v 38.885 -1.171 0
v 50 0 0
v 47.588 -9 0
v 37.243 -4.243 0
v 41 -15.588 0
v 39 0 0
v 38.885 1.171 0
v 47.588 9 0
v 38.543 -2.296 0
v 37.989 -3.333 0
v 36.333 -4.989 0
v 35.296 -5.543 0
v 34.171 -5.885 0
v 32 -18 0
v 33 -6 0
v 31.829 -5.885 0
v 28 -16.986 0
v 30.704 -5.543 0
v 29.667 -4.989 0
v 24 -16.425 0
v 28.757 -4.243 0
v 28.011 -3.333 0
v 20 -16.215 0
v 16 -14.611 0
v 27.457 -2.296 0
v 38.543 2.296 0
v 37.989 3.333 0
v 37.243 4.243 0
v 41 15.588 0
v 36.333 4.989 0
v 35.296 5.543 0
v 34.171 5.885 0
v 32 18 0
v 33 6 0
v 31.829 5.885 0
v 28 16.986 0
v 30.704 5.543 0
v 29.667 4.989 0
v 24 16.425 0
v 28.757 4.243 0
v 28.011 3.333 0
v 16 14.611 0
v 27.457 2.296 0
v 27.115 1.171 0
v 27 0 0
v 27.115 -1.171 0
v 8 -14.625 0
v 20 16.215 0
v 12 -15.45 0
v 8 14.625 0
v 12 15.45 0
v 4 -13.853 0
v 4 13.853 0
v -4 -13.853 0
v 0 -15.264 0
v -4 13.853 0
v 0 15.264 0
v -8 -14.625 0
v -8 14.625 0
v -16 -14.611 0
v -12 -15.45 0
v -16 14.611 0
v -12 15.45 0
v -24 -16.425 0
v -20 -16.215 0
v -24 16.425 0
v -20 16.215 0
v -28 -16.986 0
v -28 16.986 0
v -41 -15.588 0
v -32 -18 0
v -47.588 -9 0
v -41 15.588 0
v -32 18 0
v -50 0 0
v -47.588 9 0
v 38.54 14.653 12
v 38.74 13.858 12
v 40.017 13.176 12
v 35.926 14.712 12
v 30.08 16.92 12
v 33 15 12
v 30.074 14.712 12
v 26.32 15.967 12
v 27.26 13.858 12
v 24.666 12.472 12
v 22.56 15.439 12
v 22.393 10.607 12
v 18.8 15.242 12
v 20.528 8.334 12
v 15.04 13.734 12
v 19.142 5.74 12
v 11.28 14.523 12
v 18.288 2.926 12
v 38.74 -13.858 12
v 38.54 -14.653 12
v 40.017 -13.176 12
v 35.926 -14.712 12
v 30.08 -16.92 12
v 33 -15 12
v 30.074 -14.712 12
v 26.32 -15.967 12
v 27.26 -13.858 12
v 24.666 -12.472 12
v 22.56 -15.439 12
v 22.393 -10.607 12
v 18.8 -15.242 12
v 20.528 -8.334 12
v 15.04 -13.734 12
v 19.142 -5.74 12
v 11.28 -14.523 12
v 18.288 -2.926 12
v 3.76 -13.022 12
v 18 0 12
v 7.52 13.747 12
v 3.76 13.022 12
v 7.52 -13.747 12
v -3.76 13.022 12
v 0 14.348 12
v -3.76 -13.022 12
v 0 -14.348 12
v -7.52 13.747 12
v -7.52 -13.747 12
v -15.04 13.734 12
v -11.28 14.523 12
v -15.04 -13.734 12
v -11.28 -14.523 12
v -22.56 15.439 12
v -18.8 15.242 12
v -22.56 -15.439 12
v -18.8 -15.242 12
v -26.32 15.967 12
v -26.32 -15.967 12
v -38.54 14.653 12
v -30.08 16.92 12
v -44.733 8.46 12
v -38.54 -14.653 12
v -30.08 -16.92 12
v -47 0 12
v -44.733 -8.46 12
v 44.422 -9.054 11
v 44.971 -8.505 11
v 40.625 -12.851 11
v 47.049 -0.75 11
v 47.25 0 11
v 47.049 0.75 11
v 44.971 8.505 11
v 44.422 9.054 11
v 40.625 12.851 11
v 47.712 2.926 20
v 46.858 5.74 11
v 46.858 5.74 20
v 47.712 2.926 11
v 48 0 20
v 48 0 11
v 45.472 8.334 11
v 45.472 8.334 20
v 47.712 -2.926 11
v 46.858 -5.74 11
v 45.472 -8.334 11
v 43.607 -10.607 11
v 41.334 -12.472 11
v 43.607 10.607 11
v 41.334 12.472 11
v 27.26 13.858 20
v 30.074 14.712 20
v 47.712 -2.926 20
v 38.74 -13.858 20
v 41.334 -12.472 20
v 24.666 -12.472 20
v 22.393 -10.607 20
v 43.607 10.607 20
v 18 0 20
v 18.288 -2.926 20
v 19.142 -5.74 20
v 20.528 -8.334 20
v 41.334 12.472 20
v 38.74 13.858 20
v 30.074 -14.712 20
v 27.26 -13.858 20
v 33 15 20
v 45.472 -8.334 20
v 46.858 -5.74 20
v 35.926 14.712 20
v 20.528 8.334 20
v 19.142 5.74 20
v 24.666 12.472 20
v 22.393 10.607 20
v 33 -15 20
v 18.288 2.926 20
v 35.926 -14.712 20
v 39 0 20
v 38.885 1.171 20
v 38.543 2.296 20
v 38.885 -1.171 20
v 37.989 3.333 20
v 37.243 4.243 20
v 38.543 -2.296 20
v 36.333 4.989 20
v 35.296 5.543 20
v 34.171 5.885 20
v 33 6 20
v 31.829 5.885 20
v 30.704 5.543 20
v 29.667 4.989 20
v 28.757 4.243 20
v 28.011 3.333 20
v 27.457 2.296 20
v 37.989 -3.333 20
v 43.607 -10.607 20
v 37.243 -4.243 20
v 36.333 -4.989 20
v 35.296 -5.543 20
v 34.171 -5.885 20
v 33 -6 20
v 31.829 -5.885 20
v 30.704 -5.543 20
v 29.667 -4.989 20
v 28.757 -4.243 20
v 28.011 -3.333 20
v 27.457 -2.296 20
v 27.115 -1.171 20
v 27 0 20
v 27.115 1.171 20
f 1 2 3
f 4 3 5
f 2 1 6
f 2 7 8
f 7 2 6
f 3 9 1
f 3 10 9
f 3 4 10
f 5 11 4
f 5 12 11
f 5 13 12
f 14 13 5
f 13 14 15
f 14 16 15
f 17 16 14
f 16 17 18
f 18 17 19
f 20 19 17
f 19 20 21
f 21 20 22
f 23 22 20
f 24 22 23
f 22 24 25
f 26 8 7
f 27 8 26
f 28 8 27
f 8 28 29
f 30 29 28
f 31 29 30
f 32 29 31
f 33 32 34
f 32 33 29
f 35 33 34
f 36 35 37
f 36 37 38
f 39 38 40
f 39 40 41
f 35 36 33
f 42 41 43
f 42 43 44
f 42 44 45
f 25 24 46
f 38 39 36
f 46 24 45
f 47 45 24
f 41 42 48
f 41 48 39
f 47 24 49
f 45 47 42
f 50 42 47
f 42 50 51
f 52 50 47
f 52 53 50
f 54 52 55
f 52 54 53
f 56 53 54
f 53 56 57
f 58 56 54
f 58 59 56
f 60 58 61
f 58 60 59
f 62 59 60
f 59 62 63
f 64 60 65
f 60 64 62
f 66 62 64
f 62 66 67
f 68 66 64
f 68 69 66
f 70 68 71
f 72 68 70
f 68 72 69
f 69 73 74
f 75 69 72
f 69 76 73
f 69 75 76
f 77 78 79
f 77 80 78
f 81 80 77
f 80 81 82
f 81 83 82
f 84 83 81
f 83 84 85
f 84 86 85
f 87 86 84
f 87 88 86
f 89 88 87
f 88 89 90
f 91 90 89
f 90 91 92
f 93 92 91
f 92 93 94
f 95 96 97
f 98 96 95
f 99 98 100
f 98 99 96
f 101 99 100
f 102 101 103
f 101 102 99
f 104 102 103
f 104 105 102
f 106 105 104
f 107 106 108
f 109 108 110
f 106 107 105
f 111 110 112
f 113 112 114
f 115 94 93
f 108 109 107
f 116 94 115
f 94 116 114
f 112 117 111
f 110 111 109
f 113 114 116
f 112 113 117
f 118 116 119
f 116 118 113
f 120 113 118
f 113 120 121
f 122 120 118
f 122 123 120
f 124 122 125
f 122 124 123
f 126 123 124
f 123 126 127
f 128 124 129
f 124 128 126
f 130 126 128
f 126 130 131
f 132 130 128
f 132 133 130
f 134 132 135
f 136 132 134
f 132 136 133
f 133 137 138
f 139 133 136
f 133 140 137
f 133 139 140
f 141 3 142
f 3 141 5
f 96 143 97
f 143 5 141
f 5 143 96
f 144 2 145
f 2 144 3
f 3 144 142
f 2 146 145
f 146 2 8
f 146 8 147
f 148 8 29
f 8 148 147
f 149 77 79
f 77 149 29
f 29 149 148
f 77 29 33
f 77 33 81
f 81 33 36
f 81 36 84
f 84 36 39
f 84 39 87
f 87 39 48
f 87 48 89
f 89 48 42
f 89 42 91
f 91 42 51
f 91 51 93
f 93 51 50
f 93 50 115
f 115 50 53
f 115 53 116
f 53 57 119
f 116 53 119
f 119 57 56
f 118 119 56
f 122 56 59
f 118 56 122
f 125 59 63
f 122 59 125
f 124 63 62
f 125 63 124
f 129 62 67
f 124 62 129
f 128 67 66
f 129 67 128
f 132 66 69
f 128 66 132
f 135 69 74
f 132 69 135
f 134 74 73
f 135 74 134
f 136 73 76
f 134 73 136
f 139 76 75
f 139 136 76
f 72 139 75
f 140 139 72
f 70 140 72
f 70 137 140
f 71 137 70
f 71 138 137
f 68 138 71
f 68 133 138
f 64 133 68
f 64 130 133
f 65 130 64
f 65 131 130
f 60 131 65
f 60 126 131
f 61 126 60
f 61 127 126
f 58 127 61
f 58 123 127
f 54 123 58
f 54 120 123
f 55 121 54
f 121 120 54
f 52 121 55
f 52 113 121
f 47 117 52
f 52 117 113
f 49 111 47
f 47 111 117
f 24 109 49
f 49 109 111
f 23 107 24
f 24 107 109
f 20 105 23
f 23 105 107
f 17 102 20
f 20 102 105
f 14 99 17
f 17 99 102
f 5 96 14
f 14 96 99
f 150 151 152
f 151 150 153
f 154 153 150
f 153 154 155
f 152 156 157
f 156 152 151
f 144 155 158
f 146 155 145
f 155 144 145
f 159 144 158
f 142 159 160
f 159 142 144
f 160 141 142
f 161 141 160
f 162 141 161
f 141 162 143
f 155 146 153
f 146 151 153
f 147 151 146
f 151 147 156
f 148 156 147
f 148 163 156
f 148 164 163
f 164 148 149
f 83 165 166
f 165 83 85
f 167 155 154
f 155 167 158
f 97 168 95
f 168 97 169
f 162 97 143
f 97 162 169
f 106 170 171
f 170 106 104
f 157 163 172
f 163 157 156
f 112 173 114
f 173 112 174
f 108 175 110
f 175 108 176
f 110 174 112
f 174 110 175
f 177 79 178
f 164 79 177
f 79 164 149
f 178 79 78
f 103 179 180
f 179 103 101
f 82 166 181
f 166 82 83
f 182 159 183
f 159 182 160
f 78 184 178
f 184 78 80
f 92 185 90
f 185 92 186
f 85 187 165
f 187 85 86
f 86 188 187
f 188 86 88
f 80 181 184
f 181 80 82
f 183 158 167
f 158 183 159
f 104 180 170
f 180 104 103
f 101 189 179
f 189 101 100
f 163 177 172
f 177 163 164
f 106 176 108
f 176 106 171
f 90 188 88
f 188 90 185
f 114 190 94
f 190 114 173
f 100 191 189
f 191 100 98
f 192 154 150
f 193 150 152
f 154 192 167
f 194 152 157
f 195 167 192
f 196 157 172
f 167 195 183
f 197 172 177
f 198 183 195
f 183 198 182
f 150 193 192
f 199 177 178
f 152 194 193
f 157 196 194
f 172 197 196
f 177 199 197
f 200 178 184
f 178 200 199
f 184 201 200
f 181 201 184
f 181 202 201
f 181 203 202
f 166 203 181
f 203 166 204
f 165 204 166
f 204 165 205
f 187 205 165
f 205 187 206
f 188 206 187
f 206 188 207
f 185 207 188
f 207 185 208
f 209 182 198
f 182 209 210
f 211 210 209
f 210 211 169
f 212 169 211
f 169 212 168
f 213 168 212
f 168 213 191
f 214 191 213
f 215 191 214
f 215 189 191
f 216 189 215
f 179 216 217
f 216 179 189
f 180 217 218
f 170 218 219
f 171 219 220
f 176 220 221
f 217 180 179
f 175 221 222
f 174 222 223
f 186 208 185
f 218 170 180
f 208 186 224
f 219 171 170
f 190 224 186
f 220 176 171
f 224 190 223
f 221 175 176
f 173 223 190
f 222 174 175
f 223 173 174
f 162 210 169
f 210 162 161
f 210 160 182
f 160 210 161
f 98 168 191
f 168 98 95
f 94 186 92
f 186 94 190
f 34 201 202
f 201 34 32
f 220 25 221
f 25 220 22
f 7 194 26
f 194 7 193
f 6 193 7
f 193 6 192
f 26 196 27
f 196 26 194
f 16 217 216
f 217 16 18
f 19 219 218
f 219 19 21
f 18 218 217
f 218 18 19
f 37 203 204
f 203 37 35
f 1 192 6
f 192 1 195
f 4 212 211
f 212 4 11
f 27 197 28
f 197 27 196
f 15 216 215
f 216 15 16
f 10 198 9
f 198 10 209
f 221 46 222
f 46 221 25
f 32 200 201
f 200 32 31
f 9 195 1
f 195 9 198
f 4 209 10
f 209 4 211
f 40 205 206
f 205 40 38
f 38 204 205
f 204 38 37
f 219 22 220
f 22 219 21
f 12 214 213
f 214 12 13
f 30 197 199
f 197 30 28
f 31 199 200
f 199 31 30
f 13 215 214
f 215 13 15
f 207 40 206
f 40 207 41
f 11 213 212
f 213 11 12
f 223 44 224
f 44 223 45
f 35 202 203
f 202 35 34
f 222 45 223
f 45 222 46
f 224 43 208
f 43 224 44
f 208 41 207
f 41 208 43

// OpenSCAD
$fn = 32;

// ----------------------------------------------------------------------
// Handle: 100 x 36 mm grip, 12 mm thick
// ----------------------------------------------------------------------

// --- parameters (mm) ---
length = 100;             // grip length
width = 36;               // grip width
thickness = 12;           // grip thickness
waist = 0.8;              // width factor at the middle
draft = 0.94;             // top face scale of the extrusion
scallops = 6;             // finger rests per side
ripple = 0.06;            // depth factor of the finger rests
boss_d = 30;              // mounting boss diameter
boss_h = 8;               // mounting boss height
boss_hole_d = 12;         // screw clearance through the boss
boss_r = 33;              // boss centre from the grip centre

/* ergonomic grip outline, closed spline-like polygon in the XY plane */
grip = [[-32, 18], [-28, 16.986], [-24, 16.425], [-20, 16.215], [-16, 14.611], [-12, 15.45], [-8, 14.625], [-4, 13.853], [0, 15.264], [4, 13.853], [8, 14.625], [12, 15.45], [16, 14.611], [20, 16.215], [24, 16.425], [28, 16.986], [32, 18], [41, 15.588], [47.588, 9], [50, 0], [47.588, -9], [41, -15.588], [32, -18], [32, -18], [28, -16.986], [24, -16.425], [20, -16.215], [16, -14.611], [12, -15.45], [8, -14.625], [4, -13.853], [0, -15.264], [-4, -13.853], [-8, -14.625], [-12, -15.45], [-16, -14.611], [-20, -16.215], [-24, -16.425], [-28, -16.986], [-32, -18], [-41, -15.588], [-47.588, -9], [-50, 0], [-47.588, 9], [-41, 15.588], [-32, 18]];

module grip_body() {
  linear_extrude(height = thickness, scale = draft) polygon(grip);
}

module boss_body() {
  /* sunk 1 mm into the grip so the joint overlaps */
  translate([boss_r, 0, thickness - 1]) cylinder(h = boss_h + 1, d = boss_d);
}

difference() {
  union() {
    grip_body();
    boss_body();
  }
  translate([boss_r, 0, -1]) cylinder(h = thickness + boss_h + 2, d = boss_hole_d);
}
